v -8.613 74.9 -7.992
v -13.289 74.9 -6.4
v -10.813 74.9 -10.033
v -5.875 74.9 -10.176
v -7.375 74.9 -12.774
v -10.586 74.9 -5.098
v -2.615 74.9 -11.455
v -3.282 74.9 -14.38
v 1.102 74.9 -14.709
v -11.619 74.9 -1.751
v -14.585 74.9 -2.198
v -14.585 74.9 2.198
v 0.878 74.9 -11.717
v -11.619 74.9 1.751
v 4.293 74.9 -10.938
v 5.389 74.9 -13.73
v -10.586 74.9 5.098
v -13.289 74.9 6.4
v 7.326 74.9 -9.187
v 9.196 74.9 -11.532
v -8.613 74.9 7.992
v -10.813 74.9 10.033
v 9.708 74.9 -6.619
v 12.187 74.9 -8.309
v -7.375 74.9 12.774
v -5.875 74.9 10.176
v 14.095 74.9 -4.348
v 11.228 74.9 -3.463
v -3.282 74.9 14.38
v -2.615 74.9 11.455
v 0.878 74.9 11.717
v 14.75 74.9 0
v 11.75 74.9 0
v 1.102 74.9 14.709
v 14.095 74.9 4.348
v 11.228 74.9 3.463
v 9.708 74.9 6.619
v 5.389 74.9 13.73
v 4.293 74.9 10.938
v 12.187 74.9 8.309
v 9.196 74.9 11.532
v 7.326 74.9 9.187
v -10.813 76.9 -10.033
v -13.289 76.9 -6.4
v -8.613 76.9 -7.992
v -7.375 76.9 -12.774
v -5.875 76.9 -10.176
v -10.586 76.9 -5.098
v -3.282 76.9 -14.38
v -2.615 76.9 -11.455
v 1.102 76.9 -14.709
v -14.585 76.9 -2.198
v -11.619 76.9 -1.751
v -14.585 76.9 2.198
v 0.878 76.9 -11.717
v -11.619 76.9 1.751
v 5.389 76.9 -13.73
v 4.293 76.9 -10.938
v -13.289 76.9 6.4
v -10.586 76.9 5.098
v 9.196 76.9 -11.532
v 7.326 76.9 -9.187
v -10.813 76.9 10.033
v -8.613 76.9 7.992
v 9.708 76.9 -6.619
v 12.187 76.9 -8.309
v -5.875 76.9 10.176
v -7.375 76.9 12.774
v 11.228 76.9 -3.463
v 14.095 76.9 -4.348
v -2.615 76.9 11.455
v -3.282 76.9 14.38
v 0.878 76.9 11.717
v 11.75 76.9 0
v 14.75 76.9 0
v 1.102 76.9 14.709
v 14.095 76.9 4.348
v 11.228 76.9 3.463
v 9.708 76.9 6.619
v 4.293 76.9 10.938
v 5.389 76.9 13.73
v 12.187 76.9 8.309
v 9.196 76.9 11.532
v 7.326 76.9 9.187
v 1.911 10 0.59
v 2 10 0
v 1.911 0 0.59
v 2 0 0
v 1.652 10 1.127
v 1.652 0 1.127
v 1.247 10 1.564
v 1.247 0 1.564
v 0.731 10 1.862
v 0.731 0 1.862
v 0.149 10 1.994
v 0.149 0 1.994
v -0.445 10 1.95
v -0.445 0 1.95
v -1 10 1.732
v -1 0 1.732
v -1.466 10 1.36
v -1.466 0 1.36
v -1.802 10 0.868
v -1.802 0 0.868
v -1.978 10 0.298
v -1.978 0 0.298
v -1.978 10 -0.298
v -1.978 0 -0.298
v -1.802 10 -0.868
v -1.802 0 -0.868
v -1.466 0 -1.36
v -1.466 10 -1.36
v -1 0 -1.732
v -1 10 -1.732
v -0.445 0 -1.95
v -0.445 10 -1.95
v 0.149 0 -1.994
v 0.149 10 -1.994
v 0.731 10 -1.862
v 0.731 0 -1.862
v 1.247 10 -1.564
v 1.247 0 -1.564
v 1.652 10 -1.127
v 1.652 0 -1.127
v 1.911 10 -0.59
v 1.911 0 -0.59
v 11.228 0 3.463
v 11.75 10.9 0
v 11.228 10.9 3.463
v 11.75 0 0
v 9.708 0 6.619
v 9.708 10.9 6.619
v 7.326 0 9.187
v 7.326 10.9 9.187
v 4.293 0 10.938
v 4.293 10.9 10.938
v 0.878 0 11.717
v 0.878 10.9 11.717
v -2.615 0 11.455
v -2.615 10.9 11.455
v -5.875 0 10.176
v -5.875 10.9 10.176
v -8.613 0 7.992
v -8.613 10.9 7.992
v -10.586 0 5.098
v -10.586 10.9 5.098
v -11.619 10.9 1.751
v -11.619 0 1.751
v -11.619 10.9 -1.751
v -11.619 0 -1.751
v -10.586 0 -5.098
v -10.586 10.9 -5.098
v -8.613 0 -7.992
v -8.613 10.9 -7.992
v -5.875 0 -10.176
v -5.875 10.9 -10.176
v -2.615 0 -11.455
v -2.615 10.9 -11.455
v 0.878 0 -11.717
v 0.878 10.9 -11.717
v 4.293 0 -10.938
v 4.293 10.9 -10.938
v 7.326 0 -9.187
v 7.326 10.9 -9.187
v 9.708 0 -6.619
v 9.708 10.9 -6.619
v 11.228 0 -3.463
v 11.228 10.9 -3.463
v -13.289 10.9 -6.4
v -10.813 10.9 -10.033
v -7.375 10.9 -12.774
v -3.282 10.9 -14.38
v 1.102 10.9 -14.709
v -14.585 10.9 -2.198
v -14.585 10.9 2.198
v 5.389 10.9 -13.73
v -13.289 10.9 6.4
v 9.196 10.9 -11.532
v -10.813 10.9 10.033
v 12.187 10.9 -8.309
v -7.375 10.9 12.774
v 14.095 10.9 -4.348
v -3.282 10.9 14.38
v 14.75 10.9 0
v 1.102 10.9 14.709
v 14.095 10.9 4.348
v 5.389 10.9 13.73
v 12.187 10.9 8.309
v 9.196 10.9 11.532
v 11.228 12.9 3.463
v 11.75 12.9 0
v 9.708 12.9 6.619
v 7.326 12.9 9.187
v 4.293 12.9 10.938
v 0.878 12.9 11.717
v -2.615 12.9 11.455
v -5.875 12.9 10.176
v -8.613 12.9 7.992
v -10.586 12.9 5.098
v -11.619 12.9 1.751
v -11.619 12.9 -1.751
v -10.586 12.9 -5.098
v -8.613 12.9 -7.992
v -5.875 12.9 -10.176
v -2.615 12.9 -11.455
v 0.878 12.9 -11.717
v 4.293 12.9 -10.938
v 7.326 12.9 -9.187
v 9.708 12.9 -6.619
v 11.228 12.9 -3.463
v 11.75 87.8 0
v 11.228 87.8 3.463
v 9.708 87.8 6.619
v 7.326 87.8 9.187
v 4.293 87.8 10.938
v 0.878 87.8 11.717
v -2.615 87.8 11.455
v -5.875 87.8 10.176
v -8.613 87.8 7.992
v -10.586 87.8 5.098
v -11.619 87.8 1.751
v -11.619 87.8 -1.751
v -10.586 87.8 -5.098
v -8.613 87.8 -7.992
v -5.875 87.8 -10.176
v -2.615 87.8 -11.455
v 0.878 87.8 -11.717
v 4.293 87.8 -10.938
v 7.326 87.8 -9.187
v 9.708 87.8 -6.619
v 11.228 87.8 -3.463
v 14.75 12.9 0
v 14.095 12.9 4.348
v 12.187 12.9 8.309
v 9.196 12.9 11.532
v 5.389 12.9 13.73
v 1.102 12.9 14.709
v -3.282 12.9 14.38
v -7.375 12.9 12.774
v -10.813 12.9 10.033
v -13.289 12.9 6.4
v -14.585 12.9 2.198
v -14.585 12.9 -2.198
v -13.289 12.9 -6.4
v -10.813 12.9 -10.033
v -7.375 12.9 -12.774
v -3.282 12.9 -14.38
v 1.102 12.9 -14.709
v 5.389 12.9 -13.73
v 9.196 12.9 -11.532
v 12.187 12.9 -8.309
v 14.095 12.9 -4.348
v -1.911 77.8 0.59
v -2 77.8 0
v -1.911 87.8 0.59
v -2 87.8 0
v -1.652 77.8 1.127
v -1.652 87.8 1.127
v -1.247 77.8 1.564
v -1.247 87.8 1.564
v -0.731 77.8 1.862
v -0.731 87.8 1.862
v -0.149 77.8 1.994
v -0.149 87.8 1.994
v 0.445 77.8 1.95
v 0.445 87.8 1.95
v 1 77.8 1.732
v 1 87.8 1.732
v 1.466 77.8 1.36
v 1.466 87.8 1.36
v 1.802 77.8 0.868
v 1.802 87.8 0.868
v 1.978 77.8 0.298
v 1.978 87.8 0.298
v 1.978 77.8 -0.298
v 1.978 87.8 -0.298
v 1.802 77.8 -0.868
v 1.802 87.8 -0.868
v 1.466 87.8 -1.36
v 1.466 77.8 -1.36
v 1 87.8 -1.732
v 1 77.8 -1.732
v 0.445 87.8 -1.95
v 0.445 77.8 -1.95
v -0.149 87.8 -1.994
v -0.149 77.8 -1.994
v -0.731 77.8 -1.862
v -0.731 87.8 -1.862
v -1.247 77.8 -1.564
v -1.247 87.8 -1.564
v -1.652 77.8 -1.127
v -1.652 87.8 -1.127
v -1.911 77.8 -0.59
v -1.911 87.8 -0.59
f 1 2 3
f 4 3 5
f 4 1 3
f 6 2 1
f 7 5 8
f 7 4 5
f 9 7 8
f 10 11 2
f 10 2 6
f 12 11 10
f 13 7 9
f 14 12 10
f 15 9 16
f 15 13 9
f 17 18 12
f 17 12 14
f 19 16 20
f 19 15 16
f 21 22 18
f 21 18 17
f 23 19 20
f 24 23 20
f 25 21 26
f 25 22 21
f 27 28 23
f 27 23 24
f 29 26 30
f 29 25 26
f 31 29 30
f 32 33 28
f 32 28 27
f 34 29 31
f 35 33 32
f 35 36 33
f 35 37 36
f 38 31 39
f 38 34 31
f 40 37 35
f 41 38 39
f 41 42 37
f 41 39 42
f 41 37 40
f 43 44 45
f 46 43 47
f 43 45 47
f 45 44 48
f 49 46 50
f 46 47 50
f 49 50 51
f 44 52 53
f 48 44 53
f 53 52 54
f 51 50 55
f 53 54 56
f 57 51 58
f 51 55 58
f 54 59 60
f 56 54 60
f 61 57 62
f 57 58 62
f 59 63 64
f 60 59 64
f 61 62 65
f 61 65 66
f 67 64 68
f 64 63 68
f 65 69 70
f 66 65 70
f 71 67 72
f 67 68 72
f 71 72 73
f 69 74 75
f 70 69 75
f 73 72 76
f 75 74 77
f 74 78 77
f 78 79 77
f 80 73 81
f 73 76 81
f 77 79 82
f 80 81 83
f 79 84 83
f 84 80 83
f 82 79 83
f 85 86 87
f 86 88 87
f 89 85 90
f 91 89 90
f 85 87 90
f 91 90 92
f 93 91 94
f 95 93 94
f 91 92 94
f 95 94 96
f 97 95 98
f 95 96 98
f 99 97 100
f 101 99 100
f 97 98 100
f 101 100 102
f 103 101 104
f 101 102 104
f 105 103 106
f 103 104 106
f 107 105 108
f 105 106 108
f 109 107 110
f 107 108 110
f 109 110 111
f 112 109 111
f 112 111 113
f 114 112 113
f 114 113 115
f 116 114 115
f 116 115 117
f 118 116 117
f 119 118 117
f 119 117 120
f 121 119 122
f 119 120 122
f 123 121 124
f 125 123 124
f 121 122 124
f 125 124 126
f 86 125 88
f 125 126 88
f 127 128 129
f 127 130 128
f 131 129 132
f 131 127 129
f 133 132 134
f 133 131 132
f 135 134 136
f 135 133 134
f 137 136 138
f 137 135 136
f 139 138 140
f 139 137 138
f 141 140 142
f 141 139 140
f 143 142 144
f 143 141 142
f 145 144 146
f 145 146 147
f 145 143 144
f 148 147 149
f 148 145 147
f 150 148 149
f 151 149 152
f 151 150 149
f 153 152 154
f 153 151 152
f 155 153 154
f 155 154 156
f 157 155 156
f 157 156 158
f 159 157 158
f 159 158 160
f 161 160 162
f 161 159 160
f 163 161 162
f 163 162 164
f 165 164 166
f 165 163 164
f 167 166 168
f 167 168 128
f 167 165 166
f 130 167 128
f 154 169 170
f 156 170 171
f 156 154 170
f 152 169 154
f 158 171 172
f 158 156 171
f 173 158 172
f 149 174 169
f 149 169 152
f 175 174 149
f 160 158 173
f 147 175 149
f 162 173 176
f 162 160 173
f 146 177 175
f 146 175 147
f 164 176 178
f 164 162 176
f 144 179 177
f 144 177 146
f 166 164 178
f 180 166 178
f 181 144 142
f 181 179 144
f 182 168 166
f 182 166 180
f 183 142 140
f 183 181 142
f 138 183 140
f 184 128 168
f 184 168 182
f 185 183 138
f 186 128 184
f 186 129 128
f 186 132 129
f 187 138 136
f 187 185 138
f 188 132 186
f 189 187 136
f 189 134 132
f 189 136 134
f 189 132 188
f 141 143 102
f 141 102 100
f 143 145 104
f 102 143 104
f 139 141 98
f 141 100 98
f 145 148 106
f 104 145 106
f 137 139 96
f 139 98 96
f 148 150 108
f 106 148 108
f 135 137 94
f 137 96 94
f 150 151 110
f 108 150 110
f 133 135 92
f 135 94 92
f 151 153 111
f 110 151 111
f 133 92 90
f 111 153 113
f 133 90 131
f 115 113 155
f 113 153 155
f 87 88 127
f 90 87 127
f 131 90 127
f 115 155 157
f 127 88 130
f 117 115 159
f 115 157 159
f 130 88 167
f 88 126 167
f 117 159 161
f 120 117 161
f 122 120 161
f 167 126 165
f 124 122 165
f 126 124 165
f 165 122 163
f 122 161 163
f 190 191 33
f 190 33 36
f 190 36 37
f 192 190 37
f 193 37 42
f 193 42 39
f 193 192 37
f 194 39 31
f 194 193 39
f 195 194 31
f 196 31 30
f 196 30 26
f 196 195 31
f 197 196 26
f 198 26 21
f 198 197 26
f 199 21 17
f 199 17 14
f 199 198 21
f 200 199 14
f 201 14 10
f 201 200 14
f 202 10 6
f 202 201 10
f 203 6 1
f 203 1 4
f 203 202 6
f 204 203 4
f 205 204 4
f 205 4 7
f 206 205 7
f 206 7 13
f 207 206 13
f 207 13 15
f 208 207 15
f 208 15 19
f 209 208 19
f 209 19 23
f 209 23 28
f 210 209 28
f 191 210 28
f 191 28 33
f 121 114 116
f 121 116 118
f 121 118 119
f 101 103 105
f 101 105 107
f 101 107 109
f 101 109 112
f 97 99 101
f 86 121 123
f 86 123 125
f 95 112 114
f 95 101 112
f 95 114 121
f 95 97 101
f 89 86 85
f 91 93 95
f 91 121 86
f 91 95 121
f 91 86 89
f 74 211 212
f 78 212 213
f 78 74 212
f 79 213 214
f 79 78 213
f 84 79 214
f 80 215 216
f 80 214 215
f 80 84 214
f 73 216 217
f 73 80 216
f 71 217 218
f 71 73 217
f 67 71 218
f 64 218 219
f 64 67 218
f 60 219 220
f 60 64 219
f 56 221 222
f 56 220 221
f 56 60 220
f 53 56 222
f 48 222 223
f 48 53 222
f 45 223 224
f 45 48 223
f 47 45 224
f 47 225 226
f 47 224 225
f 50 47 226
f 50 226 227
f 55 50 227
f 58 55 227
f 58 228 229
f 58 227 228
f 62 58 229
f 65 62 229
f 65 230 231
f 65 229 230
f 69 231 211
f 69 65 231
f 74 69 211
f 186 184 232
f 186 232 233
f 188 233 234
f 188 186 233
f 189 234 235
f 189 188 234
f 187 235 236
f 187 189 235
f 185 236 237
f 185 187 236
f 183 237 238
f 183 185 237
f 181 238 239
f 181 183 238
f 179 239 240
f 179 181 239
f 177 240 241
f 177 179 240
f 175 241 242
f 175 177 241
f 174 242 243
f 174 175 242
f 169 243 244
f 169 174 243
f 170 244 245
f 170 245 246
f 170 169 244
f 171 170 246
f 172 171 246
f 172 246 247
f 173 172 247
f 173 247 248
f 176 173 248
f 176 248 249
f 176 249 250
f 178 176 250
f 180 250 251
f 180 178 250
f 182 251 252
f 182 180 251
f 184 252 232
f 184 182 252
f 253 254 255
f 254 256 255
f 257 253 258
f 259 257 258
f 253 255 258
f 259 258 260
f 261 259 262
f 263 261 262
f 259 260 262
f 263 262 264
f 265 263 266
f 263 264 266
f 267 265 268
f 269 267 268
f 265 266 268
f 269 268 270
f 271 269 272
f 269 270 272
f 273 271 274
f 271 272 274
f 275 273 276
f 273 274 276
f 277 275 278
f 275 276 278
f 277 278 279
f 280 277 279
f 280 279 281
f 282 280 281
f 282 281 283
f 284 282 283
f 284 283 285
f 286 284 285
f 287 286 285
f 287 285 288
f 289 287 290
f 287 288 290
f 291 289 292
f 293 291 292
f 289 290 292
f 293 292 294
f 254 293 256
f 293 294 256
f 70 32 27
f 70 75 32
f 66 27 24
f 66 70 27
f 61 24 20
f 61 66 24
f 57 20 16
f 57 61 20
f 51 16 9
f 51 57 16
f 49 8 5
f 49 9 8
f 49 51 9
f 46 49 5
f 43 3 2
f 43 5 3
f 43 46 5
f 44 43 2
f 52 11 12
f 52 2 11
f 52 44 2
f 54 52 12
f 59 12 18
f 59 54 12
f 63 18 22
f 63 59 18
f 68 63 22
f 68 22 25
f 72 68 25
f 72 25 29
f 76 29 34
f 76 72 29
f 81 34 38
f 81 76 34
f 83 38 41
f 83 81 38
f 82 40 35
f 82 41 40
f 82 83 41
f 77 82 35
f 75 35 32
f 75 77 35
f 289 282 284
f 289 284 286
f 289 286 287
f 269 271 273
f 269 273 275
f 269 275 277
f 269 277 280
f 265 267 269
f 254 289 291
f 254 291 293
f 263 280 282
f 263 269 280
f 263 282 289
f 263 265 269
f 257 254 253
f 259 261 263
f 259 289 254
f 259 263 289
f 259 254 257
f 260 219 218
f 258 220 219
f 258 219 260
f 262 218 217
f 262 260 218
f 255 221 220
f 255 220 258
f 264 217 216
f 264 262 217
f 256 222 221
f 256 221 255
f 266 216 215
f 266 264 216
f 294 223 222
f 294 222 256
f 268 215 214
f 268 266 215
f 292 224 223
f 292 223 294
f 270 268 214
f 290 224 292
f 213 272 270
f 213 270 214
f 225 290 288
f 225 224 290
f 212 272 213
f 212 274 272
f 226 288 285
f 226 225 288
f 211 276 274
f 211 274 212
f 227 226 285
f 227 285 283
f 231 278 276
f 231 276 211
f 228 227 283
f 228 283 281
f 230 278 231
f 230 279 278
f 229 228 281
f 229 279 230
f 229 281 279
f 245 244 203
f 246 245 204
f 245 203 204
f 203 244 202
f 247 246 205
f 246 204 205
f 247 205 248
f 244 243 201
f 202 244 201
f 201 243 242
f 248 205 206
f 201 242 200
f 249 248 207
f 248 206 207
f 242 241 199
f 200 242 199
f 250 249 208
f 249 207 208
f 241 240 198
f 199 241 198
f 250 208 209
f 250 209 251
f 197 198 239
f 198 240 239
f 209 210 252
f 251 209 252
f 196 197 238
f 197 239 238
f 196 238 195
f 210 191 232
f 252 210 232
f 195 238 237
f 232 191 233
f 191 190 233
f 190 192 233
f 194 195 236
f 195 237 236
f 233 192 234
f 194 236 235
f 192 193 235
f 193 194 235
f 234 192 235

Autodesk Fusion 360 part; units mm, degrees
sketch "Sketch1" plane through (0, 0, 0) normal (0, 1, 0) x (1, 0, 0)
  circle A0 centre (0, 0) radius 11.75
  dimension "d1" = 23.5
extrude "Extrude1" add sketch "Sketch1" along normal blind 87.8
sketch "Sketch2" plane through (0, 0, 0) normal (0, -1, 0) x (1, 0, 0)
  circle A0 centre (0, 0) radius 11.75
  circle A1 centre (0, 0) radius 2
  dimension "d4" = 4
extrude "Extrude2" cut sketch "Sketch2" against normal blind 10 contours A1
sketch "Sketch3" plane through (0, 87.8, 0) normal (0, 1, 0) x (-1, 0, 0)
  circle A0 centre (0, 0) radius 11.75
  circle A1 centre (0, 0) radius 2
  dimension "d7" = 4
extrude "Extrude3" cut sketch "Sketch3" against normal blind 10 contours A1
sketch "Sketch4" plane through (0, 0, 0) normal (0, -1, 0) x (1, 0, 0)
  circle A0 centre (0, 0) radius 2
  circle A1 centre (0, 0) radius 11.75
  circle A2 centre (0, 0) radius 14.75
  dimension "d10" = 3
extrude "Extrude4" add sketch "Sketch4" against normal blind 2 from surface at -10.9 contours A2
extrude "Extrude5" add sketch "Sketch4" along normal blind 2 from surface at -76.9 contours A2
